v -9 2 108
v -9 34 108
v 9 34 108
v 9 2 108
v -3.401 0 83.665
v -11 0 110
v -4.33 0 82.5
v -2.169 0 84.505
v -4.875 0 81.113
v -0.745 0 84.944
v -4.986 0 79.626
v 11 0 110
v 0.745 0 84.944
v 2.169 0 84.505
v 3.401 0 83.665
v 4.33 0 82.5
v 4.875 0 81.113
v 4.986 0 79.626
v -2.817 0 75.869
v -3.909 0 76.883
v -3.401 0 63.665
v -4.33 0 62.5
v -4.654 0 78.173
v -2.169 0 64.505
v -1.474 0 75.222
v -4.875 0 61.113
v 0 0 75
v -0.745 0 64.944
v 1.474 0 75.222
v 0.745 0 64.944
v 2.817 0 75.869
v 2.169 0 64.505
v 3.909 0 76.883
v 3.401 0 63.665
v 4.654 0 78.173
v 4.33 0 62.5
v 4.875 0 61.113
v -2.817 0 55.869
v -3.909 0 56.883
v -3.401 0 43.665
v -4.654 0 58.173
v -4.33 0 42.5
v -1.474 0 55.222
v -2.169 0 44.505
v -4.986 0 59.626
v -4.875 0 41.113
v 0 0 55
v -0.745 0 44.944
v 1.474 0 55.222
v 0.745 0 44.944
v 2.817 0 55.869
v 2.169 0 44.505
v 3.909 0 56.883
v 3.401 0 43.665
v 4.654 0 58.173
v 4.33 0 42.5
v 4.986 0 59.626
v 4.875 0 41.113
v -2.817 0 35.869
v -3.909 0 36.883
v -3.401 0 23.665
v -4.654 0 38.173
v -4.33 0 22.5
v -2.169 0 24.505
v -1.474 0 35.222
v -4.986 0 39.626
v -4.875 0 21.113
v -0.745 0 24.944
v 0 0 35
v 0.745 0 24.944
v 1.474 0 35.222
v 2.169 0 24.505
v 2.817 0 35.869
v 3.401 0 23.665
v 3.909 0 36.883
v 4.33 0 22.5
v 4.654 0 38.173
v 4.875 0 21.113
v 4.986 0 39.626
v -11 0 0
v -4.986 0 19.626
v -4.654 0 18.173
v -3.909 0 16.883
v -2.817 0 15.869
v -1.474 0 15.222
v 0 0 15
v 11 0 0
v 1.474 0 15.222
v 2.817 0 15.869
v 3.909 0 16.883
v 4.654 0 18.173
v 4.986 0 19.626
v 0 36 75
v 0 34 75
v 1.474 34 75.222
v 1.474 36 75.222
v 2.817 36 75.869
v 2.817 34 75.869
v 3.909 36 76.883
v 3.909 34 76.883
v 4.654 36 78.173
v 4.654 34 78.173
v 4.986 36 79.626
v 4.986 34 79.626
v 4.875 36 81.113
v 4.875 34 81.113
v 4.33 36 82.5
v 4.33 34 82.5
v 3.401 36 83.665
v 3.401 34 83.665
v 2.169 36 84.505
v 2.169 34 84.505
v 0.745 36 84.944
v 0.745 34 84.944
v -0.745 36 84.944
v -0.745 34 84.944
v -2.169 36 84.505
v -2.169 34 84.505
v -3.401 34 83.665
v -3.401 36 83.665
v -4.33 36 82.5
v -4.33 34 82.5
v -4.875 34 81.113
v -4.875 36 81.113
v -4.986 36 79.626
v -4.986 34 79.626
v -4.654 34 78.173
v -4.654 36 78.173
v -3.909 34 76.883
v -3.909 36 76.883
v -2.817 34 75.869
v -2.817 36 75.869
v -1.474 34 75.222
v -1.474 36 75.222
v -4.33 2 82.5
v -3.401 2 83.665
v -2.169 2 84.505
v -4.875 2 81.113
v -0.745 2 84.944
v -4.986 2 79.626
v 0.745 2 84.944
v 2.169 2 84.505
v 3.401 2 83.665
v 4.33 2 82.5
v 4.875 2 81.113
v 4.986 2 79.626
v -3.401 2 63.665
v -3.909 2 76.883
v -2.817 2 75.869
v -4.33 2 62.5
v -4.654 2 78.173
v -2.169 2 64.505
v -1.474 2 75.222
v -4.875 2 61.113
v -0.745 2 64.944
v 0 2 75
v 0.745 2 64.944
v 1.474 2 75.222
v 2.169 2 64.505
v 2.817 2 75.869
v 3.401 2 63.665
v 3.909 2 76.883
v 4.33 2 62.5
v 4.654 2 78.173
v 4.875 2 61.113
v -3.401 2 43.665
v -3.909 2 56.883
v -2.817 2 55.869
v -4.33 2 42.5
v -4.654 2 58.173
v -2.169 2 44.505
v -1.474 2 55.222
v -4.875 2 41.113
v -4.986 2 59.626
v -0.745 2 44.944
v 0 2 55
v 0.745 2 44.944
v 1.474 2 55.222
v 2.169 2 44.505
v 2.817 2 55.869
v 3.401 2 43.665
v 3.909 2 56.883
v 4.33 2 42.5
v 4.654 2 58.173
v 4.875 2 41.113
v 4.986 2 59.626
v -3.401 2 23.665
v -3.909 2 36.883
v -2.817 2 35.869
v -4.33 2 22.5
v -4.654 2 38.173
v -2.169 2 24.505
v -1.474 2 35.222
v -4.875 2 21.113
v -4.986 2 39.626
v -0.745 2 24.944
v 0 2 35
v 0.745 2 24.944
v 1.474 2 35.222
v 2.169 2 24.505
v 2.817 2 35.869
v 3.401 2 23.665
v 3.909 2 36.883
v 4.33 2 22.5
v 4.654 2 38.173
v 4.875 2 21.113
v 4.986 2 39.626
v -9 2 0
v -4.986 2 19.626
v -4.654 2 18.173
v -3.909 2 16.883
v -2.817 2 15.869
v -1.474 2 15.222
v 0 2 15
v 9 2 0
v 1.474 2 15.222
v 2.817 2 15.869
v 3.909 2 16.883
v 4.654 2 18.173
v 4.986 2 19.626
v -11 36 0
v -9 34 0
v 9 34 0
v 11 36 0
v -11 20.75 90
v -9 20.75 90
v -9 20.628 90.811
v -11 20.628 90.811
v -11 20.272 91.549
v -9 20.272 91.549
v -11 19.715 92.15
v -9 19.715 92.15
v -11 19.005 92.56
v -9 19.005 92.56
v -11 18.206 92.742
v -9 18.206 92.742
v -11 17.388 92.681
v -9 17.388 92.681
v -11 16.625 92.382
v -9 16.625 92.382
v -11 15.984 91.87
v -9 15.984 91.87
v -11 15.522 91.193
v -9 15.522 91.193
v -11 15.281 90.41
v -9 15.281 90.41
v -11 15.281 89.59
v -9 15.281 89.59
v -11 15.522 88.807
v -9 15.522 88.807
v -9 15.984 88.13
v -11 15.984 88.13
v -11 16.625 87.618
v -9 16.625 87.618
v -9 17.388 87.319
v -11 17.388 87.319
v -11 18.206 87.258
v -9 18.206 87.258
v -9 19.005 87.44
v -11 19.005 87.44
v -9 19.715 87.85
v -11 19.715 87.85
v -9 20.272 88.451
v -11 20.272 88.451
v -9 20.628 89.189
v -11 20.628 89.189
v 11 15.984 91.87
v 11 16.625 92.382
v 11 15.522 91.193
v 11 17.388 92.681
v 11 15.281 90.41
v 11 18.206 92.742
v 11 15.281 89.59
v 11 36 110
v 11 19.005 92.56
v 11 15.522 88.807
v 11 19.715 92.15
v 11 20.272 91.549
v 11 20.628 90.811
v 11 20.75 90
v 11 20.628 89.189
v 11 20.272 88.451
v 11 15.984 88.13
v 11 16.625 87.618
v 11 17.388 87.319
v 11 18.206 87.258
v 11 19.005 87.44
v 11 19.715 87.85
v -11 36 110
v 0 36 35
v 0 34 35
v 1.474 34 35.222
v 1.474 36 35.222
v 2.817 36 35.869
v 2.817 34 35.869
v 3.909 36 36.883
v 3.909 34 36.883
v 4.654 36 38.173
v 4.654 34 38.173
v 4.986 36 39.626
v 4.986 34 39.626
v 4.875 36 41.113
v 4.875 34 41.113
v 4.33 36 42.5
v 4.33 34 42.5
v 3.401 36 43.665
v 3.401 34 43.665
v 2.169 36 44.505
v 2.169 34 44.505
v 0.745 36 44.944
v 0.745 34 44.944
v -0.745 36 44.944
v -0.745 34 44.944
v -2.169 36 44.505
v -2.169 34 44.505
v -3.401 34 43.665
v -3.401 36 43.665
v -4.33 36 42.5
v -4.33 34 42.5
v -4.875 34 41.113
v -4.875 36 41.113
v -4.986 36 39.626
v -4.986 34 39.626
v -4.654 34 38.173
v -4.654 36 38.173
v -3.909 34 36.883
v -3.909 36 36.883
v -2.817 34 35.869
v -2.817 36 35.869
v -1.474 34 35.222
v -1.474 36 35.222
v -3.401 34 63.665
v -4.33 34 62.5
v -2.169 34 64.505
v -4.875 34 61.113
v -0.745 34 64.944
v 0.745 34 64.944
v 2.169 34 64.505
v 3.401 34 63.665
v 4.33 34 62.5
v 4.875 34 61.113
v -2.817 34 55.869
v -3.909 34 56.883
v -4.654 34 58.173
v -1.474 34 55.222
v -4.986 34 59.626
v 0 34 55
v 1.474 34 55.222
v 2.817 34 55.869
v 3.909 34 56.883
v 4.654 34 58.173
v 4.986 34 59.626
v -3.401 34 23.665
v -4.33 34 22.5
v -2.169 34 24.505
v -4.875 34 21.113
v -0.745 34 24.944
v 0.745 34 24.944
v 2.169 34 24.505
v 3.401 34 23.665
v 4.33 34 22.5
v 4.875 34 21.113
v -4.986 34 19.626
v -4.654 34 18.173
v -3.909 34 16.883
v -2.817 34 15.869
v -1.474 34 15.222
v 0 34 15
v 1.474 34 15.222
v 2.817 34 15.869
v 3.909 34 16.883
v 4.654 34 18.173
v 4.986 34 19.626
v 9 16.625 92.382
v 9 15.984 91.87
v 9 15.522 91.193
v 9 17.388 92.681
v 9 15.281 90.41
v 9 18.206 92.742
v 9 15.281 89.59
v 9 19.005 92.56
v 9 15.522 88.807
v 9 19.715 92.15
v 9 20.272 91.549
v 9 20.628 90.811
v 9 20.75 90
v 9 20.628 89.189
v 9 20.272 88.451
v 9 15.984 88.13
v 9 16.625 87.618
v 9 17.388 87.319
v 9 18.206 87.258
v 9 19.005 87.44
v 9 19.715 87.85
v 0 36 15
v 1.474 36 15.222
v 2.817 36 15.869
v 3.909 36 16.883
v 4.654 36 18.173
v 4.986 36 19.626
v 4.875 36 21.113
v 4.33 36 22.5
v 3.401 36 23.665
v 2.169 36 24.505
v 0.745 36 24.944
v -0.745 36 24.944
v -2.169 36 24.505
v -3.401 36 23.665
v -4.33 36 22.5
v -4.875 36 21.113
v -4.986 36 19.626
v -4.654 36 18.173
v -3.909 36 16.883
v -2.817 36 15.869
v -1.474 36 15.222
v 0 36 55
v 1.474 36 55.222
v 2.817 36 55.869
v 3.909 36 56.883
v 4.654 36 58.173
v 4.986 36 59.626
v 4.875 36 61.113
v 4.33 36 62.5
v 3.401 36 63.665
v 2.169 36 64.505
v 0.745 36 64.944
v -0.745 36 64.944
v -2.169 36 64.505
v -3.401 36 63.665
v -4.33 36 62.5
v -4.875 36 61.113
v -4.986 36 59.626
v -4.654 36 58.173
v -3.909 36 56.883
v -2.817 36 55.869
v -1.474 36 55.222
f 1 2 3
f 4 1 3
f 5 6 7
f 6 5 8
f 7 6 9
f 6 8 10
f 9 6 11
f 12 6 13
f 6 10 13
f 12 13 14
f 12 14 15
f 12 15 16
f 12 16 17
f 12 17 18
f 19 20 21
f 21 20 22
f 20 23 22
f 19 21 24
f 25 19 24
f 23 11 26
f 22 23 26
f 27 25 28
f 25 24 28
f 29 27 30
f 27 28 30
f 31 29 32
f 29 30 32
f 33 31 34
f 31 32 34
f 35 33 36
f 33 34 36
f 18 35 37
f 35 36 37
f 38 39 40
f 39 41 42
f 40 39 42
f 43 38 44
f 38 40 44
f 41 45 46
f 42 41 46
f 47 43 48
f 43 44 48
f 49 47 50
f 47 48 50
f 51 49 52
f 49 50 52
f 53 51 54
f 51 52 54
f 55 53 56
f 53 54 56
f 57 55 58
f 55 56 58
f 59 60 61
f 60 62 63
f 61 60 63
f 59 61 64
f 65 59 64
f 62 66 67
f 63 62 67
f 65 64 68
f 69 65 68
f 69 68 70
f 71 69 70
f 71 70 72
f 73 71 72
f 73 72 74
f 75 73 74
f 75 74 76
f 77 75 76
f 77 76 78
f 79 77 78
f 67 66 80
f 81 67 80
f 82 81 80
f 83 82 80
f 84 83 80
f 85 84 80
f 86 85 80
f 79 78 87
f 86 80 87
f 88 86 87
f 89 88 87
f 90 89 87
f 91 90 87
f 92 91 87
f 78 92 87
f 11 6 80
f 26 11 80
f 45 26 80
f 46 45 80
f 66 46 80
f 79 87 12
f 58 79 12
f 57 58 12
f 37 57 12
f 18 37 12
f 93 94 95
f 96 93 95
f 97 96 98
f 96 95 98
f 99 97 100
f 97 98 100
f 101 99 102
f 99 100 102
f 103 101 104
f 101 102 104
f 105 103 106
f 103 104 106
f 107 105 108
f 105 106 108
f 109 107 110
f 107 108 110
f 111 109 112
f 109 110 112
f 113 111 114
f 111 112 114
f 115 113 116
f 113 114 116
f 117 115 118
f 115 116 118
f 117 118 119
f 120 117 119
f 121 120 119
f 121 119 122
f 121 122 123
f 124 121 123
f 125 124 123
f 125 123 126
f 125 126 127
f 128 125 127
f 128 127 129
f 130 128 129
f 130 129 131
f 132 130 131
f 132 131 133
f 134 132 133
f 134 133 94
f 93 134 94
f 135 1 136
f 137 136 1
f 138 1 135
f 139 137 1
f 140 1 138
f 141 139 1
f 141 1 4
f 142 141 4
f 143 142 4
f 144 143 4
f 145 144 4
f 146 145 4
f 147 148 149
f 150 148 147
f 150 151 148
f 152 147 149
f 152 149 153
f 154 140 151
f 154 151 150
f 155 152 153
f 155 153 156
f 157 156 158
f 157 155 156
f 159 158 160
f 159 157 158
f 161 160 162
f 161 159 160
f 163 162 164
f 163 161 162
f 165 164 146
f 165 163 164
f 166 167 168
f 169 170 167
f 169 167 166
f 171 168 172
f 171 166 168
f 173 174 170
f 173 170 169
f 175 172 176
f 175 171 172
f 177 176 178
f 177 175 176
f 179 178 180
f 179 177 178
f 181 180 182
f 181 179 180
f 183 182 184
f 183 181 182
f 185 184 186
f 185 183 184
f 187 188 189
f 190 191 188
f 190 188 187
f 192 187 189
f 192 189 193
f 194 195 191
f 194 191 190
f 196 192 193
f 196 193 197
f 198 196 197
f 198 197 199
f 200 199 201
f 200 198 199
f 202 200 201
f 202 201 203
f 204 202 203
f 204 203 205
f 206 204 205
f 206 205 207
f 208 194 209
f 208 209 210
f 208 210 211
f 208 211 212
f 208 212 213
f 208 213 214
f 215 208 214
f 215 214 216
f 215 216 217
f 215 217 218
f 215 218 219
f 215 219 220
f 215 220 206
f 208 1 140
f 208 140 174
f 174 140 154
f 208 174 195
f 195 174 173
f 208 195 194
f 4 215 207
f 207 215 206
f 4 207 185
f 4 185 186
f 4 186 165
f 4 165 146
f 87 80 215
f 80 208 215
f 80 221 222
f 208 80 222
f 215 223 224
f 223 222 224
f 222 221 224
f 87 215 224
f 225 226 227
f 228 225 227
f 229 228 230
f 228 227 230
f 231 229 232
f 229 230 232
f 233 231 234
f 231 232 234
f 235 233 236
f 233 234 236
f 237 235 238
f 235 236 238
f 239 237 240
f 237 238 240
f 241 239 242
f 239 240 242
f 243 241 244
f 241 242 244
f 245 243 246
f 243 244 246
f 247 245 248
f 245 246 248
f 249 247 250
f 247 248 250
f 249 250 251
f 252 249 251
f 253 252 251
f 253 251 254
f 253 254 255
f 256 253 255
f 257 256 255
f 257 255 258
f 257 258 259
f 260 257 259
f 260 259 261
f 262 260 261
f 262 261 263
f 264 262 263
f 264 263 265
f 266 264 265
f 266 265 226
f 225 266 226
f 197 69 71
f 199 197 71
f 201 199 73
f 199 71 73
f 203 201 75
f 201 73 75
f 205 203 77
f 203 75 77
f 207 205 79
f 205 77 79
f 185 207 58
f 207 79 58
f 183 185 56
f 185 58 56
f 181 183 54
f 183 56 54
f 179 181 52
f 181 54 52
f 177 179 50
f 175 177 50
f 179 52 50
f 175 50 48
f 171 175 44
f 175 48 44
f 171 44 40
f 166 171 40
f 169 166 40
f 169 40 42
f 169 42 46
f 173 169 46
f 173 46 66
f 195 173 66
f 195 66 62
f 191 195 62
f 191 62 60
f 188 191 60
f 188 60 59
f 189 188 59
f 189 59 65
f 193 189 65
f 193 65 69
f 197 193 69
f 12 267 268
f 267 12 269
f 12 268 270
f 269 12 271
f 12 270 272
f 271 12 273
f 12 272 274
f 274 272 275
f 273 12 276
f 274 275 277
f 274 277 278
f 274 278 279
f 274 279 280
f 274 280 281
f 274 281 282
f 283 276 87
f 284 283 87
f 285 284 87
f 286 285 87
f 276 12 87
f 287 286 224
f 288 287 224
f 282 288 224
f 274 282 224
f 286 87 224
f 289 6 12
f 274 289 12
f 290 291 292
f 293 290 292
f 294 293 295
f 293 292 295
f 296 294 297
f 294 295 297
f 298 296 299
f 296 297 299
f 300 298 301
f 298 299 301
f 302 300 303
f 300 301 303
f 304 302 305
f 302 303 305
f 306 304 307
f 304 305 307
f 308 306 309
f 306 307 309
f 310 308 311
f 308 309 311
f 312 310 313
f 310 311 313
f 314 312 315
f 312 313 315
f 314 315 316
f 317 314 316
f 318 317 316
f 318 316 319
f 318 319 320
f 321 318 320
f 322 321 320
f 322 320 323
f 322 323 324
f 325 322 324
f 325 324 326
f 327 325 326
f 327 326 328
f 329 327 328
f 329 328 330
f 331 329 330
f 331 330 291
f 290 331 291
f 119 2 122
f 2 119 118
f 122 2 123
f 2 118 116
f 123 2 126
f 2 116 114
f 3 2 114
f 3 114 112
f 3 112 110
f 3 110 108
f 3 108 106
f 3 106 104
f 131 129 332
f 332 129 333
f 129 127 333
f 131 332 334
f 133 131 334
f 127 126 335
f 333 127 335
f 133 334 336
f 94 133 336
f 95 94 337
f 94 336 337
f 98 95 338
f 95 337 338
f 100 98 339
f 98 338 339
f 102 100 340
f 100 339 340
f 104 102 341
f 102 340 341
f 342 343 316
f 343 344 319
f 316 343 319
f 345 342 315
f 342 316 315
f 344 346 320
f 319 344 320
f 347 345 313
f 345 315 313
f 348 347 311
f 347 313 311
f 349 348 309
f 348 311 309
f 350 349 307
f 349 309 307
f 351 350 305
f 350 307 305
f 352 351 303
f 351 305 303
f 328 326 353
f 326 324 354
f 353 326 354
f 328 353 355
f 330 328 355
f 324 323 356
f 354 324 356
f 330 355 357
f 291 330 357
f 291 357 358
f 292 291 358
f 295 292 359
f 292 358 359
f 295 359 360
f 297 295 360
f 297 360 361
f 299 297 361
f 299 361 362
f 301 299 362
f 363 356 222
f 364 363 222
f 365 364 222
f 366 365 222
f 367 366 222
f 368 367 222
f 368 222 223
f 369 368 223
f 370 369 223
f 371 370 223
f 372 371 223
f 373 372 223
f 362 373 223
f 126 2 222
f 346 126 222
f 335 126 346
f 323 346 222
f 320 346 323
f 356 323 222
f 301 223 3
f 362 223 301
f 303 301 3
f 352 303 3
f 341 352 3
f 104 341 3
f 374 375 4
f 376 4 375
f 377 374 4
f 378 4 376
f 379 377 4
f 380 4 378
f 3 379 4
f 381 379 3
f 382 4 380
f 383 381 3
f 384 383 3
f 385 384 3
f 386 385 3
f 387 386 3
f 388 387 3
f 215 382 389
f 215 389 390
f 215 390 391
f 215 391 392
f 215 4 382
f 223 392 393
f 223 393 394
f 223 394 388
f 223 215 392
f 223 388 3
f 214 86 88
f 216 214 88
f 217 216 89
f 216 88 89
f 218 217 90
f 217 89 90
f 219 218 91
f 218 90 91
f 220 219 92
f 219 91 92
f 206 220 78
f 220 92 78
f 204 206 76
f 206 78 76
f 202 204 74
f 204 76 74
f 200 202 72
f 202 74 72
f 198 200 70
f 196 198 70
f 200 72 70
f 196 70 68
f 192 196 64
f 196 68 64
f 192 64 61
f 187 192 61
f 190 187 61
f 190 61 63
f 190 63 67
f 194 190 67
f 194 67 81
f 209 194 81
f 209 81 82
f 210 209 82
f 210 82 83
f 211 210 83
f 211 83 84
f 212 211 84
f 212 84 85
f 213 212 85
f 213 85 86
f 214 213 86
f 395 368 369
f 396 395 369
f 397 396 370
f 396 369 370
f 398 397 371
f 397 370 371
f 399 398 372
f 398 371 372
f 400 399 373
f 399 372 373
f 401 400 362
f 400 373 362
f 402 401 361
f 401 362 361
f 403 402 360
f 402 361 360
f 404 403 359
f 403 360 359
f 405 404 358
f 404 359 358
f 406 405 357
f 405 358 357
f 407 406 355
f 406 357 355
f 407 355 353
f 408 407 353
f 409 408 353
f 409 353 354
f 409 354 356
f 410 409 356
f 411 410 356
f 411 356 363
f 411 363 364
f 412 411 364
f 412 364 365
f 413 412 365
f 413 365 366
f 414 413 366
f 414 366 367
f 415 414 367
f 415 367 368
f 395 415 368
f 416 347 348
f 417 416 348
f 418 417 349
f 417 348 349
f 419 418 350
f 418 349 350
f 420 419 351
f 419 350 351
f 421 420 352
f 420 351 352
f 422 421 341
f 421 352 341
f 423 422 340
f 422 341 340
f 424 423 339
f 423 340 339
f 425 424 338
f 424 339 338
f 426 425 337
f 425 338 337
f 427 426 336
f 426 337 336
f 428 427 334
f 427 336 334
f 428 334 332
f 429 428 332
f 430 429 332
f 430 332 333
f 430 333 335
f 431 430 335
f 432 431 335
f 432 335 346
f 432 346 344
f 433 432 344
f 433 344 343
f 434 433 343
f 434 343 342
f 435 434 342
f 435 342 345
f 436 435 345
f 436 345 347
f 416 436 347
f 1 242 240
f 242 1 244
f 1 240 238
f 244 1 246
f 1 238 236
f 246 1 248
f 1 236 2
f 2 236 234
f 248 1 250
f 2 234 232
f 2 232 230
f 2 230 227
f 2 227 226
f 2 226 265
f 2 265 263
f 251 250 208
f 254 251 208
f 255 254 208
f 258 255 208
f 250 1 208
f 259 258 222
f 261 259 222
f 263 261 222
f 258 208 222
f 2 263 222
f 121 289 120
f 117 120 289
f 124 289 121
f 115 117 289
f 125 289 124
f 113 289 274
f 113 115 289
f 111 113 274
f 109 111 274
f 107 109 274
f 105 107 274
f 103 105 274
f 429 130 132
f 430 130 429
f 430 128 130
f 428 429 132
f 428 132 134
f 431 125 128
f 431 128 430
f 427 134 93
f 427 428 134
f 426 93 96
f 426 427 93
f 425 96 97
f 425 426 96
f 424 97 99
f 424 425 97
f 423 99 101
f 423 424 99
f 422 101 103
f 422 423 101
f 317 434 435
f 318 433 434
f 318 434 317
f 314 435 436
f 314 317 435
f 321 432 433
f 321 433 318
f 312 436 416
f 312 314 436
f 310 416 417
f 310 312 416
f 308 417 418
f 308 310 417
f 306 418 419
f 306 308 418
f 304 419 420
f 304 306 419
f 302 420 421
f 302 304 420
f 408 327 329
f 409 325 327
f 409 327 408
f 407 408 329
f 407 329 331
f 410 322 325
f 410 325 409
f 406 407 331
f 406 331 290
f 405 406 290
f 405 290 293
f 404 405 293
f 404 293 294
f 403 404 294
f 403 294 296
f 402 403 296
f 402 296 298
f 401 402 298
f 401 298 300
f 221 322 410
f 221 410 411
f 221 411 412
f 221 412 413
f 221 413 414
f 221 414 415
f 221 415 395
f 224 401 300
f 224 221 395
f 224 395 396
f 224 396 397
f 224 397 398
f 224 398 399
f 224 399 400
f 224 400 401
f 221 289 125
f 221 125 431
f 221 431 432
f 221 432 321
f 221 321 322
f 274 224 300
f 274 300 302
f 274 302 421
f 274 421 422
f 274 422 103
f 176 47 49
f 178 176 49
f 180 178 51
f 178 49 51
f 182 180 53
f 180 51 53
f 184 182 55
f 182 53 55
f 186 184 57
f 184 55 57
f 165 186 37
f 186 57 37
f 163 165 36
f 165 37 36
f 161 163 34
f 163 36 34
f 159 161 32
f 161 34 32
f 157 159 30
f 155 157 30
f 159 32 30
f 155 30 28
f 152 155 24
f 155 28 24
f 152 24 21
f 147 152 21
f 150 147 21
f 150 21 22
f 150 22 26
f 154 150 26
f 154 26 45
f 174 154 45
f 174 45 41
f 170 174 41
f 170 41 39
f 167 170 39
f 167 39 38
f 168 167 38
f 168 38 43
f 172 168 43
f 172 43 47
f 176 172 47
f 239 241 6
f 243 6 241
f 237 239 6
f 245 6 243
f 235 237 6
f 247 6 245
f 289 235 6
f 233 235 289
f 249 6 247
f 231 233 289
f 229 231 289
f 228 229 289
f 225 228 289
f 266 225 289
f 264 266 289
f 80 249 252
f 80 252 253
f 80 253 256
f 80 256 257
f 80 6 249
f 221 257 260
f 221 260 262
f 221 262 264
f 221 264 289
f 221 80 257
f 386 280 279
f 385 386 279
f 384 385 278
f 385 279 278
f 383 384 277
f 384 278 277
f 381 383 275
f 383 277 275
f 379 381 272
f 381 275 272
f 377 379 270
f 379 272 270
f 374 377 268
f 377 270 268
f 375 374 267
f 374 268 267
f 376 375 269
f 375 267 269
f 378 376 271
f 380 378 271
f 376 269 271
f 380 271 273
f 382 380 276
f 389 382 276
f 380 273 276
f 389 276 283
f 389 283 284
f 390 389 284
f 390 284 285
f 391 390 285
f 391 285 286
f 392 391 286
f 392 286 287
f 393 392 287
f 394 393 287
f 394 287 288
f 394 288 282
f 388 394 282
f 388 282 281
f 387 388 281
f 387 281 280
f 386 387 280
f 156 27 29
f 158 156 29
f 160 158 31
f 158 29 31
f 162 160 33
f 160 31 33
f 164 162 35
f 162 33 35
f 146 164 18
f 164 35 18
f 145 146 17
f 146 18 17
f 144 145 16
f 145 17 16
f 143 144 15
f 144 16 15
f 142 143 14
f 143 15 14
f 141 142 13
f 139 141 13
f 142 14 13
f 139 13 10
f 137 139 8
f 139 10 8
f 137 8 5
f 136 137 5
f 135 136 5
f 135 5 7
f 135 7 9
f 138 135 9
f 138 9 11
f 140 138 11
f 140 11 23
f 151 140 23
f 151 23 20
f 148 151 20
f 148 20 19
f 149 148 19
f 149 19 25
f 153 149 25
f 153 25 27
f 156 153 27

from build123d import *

# Parameters (mm, degrees)
ESBO_O1_W                = 22
ESBO_O1_H                = 36
RESSALTO_EXTRUS_O1_DEPTH = 110
CASCA1_T                 = -2
ESBO_O2_R                = 5
CORTE_EXTRUS_O1_DEPTH    = 1000
ESBO_O3_R                = 2.75
CORTE_EXTRUS_O2_DEPTH    = 29


with BuildPart() as part:
    # Esboço1 → Ressalto-extrusão1 (new body)
    with BuildSketch(Plane.XY):
        with Locations((0, 18)):
            Rectangle(ESBO_O1_W, ESBO_O1_H)
    extrude(amount=RESSALTO_EXTRUS_O1_DEPTH)

    # Casca1
    casca1_openings = [part.faces().sort_by_distance(p)[0] for p in [
        (0, 18, 0),
    ]]
    offset(amount=CASCA1_T, openings=casca1_openings, kind=Kind.INTERSECTION)

    # Esboço2 → Corte-extrusão1 (cut)
    with BuildSketch(Plane(origin=(0, 0, 0), x_dir=(-1, 0, 0), z_dir=(0, -1, 0))):
        with Locations(Location((0, -20, 0), (0, 0, 90))):
            Circle(ESBO_O2_R)
        with Locations(Location((0, -40, 0), (0, 0, 90))):
            Circle(ESBO_O2_R)
        with Locations(Location((0, -60, 0), (0, 0, 90))):
            Circle(ESBO_O2_R)
        with Locations(Location((0, -80, 0), (0, 0, 90))):
            Circle(ESBO_O2_R)
    extrude(amount=-CORTE_EXTRUS_O1_DEPTH, mode=Mode.SUBTRACT)

    # Esboço3 → Corte-extrusão2 (cut)
    with BuildSketch(Plane(origin=(11, 0, 0), x_dir=(0, 0, -1), z_dir=(1, 0, 0))):
        with Locations(Location((-90, 18, 0), (0, 0, 90))):
            Circle(ESBO_O3_R)
    extrude(amount=-CORTE_EXTRUS_O2_DEPTH, mode=Mode.SUBTRACT)


solid = part.part
